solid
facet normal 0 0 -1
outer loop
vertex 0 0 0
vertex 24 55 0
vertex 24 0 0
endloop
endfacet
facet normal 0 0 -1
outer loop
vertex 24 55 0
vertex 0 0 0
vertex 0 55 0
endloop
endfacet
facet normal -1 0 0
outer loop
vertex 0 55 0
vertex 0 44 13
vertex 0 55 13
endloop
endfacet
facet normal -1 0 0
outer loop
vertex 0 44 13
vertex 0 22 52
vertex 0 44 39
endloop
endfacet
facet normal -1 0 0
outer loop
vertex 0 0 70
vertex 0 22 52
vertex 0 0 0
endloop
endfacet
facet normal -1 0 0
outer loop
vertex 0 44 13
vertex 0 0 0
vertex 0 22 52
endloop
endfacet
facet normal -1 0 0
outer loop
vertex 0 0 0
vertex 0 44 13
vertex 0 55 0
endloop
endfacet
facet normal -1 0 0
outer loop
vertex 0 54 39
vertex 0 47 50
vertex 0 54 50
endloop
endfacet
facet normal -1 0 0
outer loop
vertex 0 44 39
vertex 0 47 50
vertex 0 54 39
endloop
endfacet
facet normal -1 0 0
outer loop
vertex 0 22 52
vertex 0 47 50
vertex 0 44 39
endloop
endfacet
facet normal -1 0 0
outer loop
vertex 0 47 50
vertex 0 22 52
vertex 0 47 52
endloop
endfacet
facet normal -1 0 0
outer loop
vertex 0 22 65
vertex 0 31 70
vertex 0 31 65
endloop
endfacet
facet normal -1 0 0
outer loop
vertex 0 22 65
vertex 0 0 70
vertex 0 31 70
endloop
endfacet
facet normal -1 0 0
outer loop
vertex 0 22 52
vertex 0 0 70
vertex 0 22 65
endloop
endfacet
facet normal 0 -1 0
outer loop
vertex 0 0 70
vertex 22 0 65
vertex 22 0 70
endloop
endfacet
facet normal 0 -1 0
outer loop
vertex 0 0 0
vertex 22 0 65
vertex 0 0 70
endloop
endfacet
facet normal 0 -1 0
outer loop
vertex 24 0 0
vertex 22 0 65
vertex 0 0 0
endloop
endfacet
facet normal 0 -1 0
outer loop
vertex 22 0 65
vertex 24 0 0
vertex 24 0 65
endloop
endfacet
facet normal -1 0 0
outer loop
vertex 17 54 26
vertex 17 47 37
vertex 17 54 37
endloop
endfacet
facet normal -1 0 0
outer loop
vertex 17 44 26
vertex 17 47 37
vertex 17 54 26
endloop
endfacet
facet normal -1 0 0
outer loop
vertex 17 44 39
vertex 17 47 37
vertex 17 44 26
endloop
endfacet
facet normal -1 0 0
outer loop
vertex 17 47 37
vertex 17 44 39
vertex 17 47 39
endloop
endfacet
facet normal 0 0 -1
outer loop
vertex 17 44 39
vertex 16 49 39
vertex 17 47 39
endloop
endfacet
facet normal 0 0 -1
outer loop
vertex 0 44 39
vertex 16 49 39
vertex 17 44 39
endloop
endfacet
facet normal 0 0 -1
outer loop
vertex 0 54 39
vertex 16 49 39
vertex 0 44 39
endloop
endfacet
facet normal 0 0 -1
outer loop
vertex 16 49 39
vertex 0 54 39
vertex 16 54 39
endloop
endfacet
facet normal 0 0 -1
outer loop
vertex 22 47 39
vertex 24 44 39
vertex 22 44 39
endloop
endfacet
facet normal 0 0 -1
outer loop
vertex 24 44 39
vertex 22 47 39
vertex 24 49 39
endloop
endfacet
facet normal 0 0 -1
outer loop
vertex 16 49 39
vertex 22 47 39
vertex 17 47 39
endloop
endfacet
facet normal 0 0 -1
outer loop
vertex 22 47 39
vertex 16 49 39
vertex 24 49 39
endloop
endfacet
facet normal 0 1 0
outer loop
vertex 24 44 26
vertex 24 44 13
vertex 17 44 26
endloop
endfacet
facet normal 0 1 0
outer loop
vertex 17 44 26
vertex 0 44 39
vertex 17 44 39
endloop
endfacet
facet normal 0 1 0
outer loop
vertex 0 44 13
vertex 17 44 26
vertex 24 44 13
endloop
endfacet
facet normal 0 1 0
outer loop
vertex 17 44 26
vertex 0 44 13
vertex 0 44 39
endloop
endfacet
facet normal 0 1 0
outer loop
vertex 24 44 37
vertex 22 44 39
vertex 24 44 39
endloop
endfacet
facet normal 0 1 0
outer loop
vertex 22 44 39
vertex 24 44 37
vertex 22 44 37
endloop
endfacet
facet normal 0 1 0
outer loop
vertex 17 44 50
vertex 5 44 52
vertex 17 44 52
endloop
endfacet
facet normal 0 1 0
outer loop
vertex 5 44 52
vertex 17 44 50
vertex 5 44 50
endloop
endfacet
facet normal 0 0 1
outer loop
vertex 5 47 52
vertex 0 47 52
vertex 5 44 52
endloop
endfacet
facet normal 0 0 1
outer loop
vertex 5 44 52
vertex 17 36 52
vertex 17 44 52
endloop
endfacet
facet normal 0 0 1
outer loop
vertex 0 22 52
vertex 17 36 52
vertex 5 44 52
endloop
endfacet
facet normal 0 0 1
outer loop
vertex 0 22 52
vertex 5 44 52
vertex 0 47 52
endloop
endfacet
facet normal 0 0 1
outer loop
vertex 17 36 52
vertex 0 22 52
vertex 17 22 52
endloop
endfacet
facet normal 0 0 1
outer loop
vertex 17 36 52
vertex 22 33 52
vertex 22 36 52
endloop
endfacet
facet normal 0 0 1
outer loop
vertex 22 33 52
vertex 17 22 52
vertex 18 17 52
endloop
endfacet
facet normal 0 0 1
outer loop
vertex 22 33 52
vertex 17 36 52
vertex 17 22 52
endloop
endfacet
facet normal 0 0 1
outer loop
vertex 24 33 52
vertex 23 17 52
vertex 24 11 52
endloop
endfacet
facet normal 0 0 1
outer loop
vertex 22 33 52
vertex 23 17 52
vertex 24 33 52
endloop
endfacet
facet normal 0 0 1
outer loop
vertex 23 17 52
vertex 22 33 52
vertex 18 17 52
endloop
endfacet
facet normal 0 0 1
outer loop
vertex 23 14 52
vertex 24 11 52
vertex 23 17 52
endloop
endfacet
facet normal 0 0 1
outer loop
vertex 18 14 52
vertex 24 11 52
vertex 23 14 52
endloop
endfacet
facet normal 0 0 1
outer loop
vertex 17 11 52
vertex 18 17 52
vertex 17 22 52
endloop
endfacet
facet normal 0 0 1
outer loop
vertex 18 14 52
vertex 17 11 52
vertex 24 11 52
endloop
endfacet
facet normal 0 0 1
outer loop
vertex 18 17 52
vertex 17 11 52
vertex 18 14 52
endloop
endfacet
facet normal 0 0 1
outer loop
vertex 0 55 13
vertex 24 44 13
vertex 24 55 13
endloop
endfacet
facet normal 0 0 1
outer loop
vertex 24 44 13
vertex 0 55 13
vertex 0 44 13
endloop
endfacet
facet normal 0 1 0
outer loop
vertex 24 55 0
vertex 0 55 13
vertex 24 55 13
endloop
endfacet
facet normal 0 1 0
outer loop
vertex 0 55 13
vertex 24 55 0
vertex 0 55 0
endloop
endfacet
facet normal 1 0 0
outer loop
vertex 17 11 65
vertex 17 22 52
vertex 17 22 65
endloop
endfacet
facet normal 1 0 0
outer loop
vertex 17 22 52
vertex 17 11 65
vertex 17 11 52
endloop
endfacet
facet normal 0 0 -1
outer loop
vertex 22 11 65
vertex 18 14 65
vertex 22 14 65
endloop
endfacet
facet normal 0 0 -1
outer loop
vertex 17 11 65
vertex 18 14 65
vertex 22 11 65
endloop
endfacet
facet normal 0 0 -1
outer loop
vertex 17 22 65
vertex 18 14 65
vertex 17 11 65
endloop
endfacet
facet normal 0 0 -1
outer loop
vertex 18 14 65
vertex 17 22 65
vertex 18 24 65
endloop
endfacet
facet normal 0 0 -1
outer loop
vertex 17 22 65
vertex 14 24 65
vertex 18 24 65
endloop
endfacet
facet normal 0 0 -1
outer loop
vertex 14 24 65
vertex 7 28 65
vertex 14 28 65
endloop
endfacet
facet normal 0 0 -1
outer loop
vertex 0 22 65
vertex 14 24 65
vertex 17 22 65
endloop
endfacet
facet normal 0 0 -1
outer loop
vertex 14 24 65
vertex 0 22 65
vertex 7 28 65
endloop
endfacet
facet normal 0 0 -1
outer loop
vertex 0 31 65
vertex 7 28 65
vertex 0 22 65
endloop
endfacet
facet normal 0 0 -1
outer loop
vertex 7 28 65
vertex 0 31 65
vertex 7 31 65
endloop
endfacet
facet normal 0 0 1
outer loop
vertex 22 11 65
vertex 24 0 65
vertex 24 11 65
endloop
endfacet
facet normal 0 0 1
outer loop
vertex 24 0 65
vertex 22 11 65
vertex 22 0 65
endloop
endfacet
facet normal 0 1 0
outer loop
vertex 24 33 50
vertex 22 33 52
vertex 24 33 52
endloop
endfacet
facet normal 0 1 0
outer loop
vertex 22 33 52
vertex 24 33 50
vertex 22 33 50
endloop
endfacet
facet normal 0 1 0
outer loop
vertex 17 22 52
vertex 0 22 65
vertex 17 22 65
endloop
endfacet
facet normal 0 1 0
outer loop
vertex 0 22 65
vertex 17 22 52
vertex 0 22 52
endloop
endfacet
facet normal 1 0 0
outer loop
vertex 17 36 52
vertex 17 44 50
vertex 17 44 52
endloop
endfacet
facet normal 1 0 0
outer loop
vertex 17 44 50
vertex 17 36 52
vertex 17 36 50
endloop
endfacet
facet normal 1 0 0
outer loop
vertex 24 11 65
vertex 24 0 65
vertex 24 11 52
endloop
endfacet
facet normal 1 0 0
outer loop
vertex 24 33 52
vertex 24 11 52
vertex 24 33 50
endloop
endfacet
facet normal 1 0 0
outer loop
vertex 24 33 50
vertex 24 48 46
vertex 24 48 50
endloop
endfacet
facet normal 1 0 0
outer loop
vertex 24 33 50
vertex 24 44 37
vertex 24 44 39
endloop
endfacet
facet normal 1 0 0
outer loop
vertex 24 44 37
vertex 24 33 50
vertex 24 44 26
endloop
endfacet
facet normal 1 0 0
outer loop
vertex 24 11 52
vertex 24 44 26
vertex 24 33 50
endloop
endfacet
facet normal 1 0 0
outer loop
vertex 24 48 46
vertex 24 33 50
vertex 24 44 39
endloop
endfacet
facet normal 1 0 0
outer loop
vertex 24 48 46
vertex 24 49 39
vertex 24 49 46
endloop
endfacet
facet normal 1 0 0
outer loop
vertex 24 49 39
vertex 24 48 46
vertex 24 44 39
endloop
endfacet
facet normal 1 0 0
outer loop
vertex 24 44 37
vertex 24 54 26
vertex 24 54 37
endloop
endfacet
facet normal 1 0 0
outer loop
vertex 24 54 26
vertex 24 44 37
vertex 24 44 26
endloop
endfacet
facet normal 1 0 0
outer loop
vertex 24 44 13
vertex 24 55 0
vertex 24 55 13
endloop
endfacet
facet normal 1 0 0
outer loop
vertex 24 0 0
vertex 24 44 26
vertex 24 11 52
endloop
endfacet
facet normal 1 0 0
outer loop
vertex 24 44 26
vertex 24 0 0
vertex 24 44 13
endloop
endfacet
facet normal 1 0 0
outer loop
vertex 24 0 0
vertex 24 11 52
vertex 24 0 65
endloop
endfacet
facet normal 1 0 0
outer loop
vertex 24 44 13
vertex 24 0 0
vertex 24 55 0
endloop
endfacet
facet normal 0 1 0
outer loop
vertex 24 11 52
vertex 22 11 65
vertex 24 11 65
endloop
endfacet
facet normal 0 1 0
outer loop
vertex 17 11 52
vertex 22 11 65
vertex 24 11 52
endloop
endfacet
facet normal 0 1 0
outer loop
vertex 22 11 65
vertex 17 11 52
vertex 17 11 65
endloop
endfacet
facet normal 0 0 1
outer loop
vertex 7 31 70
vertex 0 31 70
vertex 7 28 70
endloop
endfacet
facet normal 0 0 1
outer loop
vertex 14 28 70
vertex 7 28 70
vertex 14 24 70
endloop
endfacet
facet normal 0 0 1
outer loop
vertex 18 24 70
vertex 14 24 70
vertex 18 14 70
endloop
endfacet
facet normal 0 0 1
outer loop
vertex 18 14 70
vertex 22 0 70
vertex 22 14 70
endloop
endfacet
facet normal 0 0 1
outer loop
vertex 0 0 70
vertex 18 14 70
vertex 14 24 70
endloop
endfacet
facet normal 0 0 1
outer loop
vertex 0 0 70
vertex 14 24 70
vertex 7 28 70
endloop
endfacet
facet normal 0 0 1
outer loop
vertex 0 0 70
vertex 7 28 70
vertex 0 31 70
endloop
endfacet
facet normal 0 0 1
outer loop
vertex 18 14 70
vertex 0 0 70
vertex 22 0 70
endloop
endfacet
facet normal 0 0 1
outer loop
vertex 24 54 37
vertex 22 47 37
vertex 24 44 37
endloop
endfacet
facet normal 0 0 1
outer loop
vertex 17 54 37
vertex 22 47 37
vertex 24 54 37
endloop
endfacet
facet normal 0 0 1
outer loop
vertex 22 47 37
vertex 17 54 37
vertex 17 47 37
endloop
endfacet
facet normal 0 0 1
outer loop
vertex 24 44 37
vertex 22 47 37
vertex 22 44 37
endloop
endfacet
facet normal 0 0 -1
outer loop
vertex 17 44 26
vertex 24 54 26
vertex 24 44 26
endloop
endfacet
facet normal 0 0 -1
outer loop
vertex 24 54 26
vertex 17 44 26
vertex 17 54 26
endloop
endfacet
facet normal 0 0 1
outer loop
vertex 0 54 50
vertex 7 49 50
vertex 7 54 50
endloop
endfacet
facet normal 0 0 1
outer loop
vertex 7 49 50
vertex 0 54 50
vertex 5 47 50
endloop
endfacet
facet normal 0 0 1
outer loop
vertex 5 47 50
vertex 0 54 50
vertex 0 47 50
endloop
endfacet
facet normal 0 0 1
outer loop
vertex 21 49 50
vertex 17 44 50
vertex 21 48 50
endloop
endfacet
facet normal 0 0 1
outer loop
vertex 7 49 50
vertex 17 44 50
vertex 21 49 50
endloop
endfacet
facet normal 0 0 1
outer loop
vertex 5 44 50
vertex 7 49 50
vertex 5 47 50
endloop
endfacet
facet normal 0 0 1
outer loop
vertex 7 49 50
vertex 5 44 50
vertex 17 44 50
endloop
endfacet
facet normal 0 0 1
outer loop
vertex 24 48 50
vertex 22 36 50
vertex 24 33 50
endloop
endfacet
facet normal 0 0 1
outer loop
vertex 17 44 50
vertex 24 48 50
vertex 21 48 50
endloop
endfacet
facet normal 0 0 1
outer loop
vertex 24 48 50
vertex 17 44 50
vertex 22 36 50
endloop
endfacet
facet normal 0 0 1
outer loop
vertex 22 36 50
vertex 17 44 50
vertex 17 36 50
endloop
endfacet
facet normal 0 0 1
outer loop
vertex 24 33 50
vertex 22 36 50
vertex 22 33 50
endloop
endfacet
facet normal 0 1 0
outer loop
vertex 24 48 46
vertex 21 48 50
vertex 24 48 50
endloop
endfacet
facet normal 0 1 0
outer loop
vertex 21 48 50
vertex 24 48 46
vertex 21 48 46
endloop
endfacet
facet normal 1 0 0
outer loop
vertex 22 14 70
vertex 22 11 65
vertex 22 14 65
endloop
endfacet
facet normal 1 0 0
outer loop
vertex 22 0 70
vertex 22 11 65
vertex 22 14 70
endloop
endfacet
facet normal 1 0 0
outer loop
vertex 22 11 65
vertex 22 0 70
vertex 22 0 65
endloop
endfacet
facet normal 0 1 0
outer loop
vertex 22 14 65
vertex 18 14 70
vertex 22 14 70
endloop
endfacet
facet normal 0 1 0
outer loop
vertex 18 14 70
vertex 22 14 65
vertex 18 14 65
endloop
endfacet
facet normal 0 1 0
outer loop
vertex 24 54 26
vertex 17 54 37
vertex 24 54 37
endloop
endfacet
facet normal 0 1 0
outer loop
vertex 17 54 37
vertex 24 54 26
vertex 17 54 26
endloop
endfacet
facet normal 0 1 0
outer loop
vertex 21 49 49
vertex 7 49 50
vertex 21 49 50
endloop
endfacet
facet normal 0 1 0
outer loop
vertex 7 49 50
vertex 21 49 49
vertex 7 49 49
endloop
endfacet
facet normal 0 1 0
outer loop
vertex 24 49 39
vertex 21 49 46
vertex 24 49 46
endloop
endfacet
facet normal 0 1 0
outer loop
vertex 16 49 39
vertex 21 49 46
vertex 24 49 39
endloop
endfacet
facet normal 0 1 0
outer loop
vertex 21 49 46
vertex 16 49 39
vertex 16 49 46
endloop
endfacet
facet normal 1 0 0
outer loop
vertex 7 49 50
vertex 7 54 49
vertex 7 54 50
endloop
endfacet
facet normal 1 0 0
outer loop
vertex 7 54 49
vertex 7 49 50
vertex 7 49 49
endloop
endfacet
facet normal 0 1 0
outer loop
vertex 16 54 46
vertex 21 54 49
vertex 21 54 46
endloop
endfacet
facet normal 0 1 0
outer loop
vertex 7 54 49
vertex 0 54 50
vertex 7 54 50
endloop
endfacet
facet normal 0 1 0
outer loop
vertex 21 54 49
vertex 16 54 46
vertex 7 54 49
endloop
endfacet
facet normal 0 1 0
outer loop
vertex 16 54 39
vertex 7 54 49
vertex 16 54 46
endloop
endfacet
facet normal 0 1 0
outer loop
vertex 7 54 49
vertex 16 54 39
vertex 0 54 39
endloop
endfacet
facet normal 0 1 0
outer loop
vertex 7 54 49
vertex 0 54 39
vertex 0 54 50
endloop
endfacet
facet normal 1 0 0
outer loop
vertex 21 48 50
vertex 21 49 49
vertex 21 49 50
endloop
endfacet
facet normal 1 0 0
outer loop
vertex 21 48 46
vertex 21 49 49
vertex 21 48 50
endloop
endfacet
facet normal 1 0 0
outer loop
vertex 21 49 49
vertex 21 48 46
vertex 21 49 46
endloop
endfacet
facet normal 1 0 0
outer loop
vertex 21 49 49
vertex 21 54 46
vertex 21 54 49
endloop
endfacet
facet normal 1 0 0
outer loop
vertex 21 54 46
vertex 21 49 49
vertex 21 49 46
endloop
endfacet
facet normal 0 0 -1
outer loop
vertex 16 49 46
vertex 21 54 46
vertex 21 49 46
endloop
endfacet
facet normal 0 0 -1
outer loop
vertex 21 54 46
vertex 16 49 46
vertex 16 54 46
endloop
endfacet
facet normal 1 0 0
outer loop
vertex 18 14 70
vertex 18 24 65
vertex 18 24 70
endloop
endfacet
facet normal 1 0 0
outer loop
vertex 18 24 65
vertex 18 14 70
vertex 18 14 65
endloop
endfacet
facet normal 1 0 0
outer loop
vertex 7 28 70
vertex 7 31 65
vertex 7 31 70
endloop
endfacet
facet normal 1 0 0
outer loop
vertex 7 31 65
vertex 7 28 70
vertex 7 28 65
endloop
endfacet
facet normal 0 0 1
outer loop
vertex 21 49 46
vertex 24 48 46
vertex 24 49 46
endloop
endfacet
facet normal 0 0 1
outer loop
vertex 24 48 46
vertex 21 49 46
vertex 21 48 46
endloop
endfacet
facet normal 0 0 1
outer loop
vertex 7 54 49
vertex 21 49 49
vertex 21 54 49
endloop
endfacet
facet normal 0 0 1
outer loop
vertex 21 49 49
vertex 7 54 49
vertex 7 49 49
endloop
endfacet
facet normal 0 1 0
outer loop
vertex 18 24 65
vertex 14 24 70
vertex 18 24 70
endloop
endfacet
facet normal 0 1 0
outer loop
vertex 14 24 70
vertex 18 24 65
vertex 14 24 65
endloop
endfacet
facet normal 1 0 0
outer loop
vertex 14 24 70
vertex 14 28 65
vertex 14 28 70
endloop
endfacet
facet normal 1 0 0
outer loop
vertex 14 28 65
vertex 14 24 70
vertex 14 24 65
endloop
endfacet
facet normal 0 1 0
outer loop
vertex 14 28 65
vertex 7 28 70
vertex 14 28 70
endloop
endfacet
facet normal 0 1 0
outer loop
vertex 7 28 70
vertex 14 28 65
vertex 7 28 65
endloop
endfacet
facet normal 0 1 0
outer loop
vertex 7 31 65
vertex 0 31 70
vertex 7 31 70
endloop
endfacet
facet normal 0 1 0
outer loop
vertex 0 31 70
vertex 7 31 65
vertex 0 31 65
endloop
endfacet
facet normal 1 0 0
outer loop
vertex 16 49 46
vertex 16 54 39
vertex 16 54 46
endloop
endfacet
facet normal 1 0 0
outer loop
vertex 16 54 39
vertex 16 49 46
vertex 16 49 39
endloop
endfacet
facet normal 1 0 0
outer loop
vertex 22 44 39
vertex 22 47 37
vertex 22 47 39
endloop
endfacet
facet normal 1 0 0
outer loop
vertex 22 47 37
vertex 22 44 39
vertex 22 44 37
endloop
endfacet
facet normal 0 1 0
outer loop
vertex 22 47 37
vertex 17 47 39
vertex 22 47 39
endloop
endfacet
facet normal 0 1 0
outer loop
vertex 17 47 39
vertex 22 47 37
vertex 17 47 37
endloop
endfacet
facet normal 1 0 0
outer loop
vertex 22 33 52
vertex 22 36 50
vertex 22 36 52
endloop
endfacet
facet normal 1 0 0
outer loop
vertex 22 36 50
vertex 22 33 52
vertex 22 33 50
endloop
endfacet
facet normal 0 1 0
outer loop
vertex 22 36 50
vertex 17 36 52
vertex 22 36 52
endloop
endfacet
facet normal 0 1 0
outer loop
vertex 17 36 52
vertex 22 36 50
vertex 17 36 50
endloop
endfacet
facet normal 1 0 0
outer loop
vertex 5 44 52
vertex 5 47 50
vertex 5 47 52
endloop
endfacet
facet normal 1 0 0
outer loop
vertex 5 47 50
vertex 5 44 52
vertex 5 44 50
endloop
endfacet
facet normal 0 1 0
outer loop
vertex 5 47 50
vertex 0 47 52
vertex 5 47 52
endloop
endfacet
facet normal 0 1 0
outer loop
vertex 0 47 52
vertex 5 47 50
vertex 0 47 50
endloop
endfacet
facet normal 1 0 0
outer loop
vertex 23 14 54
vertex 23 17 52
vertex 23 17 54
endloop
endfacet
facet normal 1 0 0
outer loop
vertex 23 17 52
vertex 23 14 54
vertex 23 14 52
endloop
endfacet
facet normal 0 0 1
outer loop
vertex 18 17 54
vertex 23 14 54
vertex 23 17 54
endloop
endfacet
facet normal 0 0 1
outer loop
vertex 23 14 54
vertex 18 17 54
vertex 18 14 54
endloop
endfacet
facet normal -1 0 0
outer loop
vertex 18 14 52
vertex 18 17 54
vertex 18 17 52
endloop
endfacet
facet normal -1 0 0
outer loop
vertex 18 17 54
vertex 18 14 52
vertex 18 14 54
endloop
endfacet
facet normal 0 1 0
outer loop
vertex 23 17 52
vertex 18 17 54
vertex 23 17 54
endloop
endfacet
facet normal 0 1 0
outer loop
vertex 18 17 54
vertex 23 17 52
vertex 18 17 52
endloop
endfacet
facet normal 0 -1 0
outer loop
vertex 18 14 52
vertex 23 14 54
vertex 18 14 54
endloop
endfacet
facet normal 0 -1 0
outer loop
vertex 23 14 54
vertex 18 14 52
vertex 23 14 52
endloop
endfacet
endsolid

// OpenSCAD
translate([8.5, 5.5, 6.5]) color([0.8343975914408754, 0.2506337702942619, 0.11599539642064438]) cube([17, 11, 13], center=true);
translate([8.5, 16.5, 6.5]) color([0.9817240858781537, 0.8047994372884794, 0.9431012043694105]) cube([17, 11, 13], center=true);
translate([8.5, 5.5, 19.5]) color([0.24264659424234813, 0.6738638931519124, 0.5327800265053269]) cube([17, 11, 13], center=true);
translate([8.5, 27.5, 6.5]) color([0.8756440829735669, 0.16255101499230828, 0.8680483691353614]) cube([17, 11, 13], center=true);
translate([8.5, 16.5, 19.5]) color([0.15305579700066485, 0.8462165202751376, 0.8200801239095041]) cube([17, 11, 13], center=true);
translate([8.5, 5.5, 32.5]) color([0.5849326984313064, 0.05125489506773162, 0.156166769208809]) cube([17, 11, 13], center=true);
translate([8.5, 38.5, 6.5]) color([0.34458118202681143, 0.291190613997825, 0.29342424365134856]) cube([17, 11, 13], center=true);
translate([8.5, 27.5, 19.5]) color([0.49485912757206985, 0.40365829021262367, 0.43100562682353716]) cube([17, 11, 13], center=true);
translate([8.5, 16.5, 32.5]) color([0.17003546655932655, 0.788340085303476, 0.5686027559906347]) cube([17, 11, 13], center=true);
translate([8.5, 5.5, 45.5]) color([0.44188886974638586, 0.3413461590512491, 0.009317740415098474]) cube([17, 11, 13], center=true);
translate([8.5, 49.5, 6.5]) color([0.72162474304745, 0.9099060293040379, 0.6642090292154819]) cube([17, 11, 13], center=true);
translate([8.5, 38.5, 19.5]) color([0.6628365798191557, 0.2575988974219705, 0.6122127561841502]) cube([17, 11, 13], center=true);
translate([8.5, 27.5, 32.5]) color([0.07024606726227145, 0.936077955543095, 0.27870721332570936]) cube([17, 11, 13], center=true);
translate([8.5, 16.5, 45.5]) color([0.8301443917589898, 0.5295296249528143, 0.06328696503387199]) cube([17, 11, 13], center=true);
translate([8.5, 5.5, 58.5]) color([0.639390097241117, 0.579686955437464, 0.9416538141960143]) cube([17, 11, 13], center=true);
translate([8.5, 38.5, 32.5]) color([0.6321291610349786, 0.5434228748459046, 0.38469874676133664]) cube([17, 11, 13], center=true);
translate([8.5, 27.5, 45.5]) color([0.434637548519362, 0.31139777068021024, 0.01363511702942577]) cube([17, 11, 13], center=true);
translate([8.5, 16.5, 58.5]) color([0.7785312160167684, 0.8197509625398982, 0.28044077713976767]) cube([17, 11, 13], center=true);
translate([8.5, 38.5, 45.5]) color([0.2581907625337724, 0.5272652548146236, 0.3179301097250754]) cube([17, 11, 13], center=true);
translate([20.5, 5.5, 6.5]) color([0.3422638341038545, 0.7055726929201963, 0.43169639849300545]) cube([7, 11, 13], center=true);
translate([20.5, 16.5, 6.5]) color([0.14170724037842175, 0.0059275683019511805, 0.5113413643489257]) cube([7, 11, 13], center=true);
translate([20.5, 5.5, 19.5]) color([0.7846494738841625, 0.7013909140505133, 0.7815279332048084]) cube([7, 11, 13], center=true);
translate([20.5, 27.5, 6.5]) color([0.38414456219182536, 0.4641305725985776, 0.036369164001931575]) cube([7, 11, 13], center=true);
translate([20.5, 16.5, 19.5]) color([0.9124290899309246, 0.6366653413633517, 0.798477007479407]) cube([7, 11, 13], center=true);
translate([20.5, 5.5, 32.5]) color([0.7602358551941967, 0.899814300356001, 0.3622224295816935]) cube([7, 11, 13], center=true);
translate([20.5, 38.5, 6.5]) color([0.9815510059994267, 0.15851660579635174, 0.19450942151924966]) cube([7, 11, 13], center=true);
translate([20.5, 27.5, 19.5]) color([0.35447317829590397, 0.700089123077614, 0.019141470871264166]) cube([7, 11, 13], center=true);
translate([20.5, 16.5, 32.5]) color([0.7352582011311831, 0.5715587801616956, 0.24207966979200135]) cube([7, 11, 13], center=true);
translate([20.5, 5.5, 45.5]) color([0.18514161515939986, 0.7580746928341441, 0.4199819570625165]) cube([7, 11, 13], center=true);
translate([20.5, 49.5, 6.5]) color([0.5731405723704375, 0.23673356878784502, 0.7138158488992904]) cube([7, 11, 13], center=true);
translate([20.5, 38.5, 19.5]) color([0.8637627475626694, 0.8949592620642776, 0.8103115760161889]) cube([7, 11, 13], center=true);
translate([20.5, 27.5, 32.5]) color([0.1004216369837837, 0.18827941391234093, 0.44049583318501173]) cube([7, 11, 13], center=true);
translate([20.5, 16.5, 45.5]) color([0.06522983258952386, 0.42674703623912436, 0.3947422574489625]) cube([7, 11, 13], center=true);
translate([20.5, 5.5, 58.5]) color([0.27185274848852736, 0.43721657158275895, 0.7577296702077931]) cube([7, 11, 13], center=true);
translate([20.5, 38.5, 32.5]) color([0.3561631337530091, 0.3277620307403001, 0.30701912216942273]) cube([7, 11, 13], center=true);
translate([20.5, 27.5, 45.5]) color([0.492518074892234, 0.7625268269371841, 0.2027877178963453]) cube([7, 11, 13], center=true);
translate([5.5, 3.5, 67.5]) color([0.39789846082497404, 0.4356119392473006, 0.6353731723550147]) cube([11, 7, 5], center=true);
translate([20.5, 46.5, 31.5]) color([0.673076446274384, 0.6970991483341651, 0.8225488218547198]) cube([7, 5, 11], center=true);
translate([20.5, 40.5, 44.5]) color([0.5826892216899469, 0.3545830833155835, 0.5687886411459258]) cube([7, 15, 11], center=true);
translate([3.5, 46.5, 44.5]) color([0.564415288794693, 0.2783497745403337, 0.8220051901362931]) cube([7, 5, 11], center=true);
translate([16.5, 3.5, 67.5]) color([0.39809270556066123, 0.9209203386432881, 0.13533998311747797]) cube([11, 7, 5], center=true);
translate([5.5, 10.5, 67.5]) color([0.08148203466772541, 0.8649487446802395, 0.36102136972914045]) cube([11, 7, 5], center=true);
translate([20.5, 51.5, 31.5]) color([0.06937329613248533, 0.7172877126247486, 0.671396341477498]) cube([7, 5, 11], center=true);
translate([20.5, 42.5, 44.5]) color([0.47110224547326685, 0.3145322421799046, 0.8413649413366762]) cube([7, 9, 11], center=true);
translate([10.5, 46.5, 44.5]) color([0.9545082818366412, 0.02538948740661906, 0.39264862168779513]) cube([7, 5, 11], center=true);
translate([3.5, 51.5, 44.5]) color([0.12527064222330164, 0.9928151500577586, 0.6355716010561779]) cube([7, 5, 11], center=true);
translate([16.5, 10.5, 67.5]) color([0.40641678624517696, 0.1421319514189895, 0.14748951348813844]) cube([11, 7, 5], center=true);
translate([5.5, 17.5, 67.5]) color([0.8666090764559645, 0.5114920143771782, 0.16291179601388028]) cube([11, 7, 5], center=true);
translate([17.5, 46.5, 44.5]) color([0.8928293074217152, 0.9106207302279238, 0.7053130391381187]) cube([7, 5, 11], center=true);
translate([8.5, 51.5, 42.5]) color([0.7162737307255599, 0.7235742512845528, 0.7298089625221481]) cube([3, 5, 7], center=true);
translate([14.5, 17.5, 67.5]) color([0.5196081403156461, 0.823493134639761, 0.6911885197769689]) cube([7, 7, 5], center=true);
translate([3.5, 24.5, 67.5]) color([0.6973164426626367, 0.38726457915960755, 0.18022138882203653]) cube([7, 7, 5], center=true);
translate([22.5, 46.5, 42.5]) color([0.8001465394041192, 0.8129994204848935, 0.08072942167368968]) cube([3, 5, 7], center=true);
translate([11.5, 51.5, 42.5]) color([0.17442535469903642, 0.26558344961408153, 0.8002006207478382]) cube([3, 5, 7], center=true);
translate([10.5, 51.5, 47.5]) color([0.3279381595582189, 0.7086727191051987, 0.7823295314553788]) cube([7, 5, 3], center=true);
translate([14.5, 20.5, 67.5]) color([0.5174360046946651, 0.45647885649310815, 0.9099967640280606]) cube([7, 7, 5], center=true);
translate([10.5, 24.5, 67.5]) color([0.7566722996545016, 0.44882496858184395, 0.15281911968142636]) cube([7, 7, 5], center=true);
translate([3.5, 27.5, 67.5]) color([0.6325441046469116, 0.1769660088535372, 0.5122224095001495]) cube([7, 7, 5], center=true);
translate([14.5, 51.5, 42.5]) color([0.8959696721858674, 0.31608020378500323, 0.9467436825606468]) cube([3, 5, 7], center=true);
translate([17.5, 51.5, 47.5]) color([0.1928870204716916, 0.7910187054913302, 0.6108926701450443]) cube([7, 5, 3], center=true);
translate([19.5, 45.5, 38.0]) color([0.8122678209742187, 0.5222627979471512, 0.7095307583634994]) cube([5, 3, 2], center=true);
translate([19.5, 34.5, 51.0]) color([0.9126687247694082, 0.13487625477079712, 0.7715208720856912]) cube([5, 3, 2], center=true);
translate([2.5, 45.5, 51.0]) color([0.05716454642595936, 0.08241654053773162, 0.5176706786705761]) cube([5, 3, 2], center=true);
translate([23.0, 1.5, 54.5]) color([0.0024604932439482585, 0.774865046739482, 0.10398133417765076]) cube([2, 3, 5], center=true);
translate([23.0, 8.5, 54.5]) color([0.6075408633971222, 0.5702741924791085, 0.335807396721168]) cube([2, 3, 5], center=true);
translate([20.5, 15.5, 53.0]) color([0.3780654483467295, 0.36205489178930694, 0.8413126085807436]) cube([5, 3, 2], center=true);
translate([22.5, 45.5, 47.0]) color([0.6365683683667089, 0.13610848275491239, 0.9255182446742467]) cube([3, 3, 2], center=true);
